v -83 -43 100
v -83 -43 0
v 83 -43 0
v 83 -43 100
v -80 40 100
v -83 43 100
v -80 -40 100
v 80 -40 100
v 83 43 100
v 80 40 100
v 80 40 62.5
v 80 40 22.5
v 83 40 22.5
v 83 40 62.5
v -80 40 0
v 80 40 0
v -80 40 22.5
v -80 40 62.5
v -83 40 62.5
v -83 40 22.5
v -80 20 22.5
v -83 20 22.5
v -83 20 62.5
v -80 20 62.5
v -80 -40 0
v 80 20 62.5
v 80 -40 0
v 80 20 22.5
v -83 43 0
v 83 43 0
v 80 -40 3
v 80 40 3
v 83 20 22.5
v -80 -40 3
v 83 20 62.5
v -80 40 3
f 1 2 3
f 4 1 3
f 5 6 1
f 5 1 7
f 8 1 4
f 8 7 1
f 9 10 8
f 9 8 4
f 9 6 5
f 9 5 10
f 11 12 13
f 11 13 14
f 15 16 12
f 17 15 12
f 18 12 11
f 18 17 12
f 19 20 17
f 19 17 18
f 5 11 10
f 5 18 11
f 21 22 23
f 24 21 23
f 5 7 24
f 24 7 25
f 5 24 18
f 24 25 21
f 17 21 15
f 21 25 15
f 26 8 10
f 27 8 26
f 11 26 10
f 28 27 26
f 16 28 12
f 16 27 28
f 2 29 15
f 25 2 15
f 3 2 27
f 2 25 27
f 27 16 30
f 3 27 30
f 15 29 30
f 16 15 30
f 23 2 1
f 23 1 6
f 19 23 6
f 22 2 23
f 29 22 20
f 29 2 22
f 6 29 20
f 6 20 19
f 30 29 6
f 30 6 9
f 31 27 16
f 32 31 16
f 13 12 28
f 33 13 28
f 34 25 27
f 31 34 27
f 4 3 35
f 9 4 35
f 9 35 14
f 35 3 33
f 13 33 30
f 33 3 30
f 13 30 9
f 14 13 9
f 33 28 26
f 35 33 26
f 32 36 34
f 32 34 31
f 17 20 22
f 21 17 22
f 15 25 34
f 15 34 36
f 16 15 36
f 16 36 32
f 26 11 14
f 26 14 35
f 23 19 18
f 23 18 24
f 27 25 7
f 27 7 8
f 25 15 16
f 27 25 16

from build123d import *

# Parameters (mm, degrees)
F0_W     = 160
F0_H     = 80
F1_DEPTH = 3
F0_W_2   = 166
F0_H_2   = 86
F2_DEPTH = 100
F3_W     = 20
F3_H     = 40
F4_DEPTH = 166.001


with BuildPart() as f1:
    # F0 (on Top) → F1 (new body)
    with BuildSketch(Plane.XY):
        Rectangle(F0_W, F0_H)
    extrude(amount=F1_DEPTH)


with BuildPart() as f2:
    # F0 (on Top) → F2 (new body)
    with BuildSketch(Plane.XY):
        Rectangle(F0_W_2, F0_H_2)
        Rectangle(F0_W, F0_H, mode=Mode.SUBTRACT)
    extrude(amount=F2_DEPTH)

    # F3 (on face) → F4 (cut, through all)
    with BuildSketch(Plane(origin=(-83, 0, 0), x_dir=(0, -1, 0), z_dir=(-1, 0, 0))):
        with Locations((-30, 42.5)):
            Rectangle(F3_W, F3_H)
    extrude(amount=-F4_DEPTH, mode=Mode.SUBTRACT)


solid = Compound([f1.part, f2.part])
